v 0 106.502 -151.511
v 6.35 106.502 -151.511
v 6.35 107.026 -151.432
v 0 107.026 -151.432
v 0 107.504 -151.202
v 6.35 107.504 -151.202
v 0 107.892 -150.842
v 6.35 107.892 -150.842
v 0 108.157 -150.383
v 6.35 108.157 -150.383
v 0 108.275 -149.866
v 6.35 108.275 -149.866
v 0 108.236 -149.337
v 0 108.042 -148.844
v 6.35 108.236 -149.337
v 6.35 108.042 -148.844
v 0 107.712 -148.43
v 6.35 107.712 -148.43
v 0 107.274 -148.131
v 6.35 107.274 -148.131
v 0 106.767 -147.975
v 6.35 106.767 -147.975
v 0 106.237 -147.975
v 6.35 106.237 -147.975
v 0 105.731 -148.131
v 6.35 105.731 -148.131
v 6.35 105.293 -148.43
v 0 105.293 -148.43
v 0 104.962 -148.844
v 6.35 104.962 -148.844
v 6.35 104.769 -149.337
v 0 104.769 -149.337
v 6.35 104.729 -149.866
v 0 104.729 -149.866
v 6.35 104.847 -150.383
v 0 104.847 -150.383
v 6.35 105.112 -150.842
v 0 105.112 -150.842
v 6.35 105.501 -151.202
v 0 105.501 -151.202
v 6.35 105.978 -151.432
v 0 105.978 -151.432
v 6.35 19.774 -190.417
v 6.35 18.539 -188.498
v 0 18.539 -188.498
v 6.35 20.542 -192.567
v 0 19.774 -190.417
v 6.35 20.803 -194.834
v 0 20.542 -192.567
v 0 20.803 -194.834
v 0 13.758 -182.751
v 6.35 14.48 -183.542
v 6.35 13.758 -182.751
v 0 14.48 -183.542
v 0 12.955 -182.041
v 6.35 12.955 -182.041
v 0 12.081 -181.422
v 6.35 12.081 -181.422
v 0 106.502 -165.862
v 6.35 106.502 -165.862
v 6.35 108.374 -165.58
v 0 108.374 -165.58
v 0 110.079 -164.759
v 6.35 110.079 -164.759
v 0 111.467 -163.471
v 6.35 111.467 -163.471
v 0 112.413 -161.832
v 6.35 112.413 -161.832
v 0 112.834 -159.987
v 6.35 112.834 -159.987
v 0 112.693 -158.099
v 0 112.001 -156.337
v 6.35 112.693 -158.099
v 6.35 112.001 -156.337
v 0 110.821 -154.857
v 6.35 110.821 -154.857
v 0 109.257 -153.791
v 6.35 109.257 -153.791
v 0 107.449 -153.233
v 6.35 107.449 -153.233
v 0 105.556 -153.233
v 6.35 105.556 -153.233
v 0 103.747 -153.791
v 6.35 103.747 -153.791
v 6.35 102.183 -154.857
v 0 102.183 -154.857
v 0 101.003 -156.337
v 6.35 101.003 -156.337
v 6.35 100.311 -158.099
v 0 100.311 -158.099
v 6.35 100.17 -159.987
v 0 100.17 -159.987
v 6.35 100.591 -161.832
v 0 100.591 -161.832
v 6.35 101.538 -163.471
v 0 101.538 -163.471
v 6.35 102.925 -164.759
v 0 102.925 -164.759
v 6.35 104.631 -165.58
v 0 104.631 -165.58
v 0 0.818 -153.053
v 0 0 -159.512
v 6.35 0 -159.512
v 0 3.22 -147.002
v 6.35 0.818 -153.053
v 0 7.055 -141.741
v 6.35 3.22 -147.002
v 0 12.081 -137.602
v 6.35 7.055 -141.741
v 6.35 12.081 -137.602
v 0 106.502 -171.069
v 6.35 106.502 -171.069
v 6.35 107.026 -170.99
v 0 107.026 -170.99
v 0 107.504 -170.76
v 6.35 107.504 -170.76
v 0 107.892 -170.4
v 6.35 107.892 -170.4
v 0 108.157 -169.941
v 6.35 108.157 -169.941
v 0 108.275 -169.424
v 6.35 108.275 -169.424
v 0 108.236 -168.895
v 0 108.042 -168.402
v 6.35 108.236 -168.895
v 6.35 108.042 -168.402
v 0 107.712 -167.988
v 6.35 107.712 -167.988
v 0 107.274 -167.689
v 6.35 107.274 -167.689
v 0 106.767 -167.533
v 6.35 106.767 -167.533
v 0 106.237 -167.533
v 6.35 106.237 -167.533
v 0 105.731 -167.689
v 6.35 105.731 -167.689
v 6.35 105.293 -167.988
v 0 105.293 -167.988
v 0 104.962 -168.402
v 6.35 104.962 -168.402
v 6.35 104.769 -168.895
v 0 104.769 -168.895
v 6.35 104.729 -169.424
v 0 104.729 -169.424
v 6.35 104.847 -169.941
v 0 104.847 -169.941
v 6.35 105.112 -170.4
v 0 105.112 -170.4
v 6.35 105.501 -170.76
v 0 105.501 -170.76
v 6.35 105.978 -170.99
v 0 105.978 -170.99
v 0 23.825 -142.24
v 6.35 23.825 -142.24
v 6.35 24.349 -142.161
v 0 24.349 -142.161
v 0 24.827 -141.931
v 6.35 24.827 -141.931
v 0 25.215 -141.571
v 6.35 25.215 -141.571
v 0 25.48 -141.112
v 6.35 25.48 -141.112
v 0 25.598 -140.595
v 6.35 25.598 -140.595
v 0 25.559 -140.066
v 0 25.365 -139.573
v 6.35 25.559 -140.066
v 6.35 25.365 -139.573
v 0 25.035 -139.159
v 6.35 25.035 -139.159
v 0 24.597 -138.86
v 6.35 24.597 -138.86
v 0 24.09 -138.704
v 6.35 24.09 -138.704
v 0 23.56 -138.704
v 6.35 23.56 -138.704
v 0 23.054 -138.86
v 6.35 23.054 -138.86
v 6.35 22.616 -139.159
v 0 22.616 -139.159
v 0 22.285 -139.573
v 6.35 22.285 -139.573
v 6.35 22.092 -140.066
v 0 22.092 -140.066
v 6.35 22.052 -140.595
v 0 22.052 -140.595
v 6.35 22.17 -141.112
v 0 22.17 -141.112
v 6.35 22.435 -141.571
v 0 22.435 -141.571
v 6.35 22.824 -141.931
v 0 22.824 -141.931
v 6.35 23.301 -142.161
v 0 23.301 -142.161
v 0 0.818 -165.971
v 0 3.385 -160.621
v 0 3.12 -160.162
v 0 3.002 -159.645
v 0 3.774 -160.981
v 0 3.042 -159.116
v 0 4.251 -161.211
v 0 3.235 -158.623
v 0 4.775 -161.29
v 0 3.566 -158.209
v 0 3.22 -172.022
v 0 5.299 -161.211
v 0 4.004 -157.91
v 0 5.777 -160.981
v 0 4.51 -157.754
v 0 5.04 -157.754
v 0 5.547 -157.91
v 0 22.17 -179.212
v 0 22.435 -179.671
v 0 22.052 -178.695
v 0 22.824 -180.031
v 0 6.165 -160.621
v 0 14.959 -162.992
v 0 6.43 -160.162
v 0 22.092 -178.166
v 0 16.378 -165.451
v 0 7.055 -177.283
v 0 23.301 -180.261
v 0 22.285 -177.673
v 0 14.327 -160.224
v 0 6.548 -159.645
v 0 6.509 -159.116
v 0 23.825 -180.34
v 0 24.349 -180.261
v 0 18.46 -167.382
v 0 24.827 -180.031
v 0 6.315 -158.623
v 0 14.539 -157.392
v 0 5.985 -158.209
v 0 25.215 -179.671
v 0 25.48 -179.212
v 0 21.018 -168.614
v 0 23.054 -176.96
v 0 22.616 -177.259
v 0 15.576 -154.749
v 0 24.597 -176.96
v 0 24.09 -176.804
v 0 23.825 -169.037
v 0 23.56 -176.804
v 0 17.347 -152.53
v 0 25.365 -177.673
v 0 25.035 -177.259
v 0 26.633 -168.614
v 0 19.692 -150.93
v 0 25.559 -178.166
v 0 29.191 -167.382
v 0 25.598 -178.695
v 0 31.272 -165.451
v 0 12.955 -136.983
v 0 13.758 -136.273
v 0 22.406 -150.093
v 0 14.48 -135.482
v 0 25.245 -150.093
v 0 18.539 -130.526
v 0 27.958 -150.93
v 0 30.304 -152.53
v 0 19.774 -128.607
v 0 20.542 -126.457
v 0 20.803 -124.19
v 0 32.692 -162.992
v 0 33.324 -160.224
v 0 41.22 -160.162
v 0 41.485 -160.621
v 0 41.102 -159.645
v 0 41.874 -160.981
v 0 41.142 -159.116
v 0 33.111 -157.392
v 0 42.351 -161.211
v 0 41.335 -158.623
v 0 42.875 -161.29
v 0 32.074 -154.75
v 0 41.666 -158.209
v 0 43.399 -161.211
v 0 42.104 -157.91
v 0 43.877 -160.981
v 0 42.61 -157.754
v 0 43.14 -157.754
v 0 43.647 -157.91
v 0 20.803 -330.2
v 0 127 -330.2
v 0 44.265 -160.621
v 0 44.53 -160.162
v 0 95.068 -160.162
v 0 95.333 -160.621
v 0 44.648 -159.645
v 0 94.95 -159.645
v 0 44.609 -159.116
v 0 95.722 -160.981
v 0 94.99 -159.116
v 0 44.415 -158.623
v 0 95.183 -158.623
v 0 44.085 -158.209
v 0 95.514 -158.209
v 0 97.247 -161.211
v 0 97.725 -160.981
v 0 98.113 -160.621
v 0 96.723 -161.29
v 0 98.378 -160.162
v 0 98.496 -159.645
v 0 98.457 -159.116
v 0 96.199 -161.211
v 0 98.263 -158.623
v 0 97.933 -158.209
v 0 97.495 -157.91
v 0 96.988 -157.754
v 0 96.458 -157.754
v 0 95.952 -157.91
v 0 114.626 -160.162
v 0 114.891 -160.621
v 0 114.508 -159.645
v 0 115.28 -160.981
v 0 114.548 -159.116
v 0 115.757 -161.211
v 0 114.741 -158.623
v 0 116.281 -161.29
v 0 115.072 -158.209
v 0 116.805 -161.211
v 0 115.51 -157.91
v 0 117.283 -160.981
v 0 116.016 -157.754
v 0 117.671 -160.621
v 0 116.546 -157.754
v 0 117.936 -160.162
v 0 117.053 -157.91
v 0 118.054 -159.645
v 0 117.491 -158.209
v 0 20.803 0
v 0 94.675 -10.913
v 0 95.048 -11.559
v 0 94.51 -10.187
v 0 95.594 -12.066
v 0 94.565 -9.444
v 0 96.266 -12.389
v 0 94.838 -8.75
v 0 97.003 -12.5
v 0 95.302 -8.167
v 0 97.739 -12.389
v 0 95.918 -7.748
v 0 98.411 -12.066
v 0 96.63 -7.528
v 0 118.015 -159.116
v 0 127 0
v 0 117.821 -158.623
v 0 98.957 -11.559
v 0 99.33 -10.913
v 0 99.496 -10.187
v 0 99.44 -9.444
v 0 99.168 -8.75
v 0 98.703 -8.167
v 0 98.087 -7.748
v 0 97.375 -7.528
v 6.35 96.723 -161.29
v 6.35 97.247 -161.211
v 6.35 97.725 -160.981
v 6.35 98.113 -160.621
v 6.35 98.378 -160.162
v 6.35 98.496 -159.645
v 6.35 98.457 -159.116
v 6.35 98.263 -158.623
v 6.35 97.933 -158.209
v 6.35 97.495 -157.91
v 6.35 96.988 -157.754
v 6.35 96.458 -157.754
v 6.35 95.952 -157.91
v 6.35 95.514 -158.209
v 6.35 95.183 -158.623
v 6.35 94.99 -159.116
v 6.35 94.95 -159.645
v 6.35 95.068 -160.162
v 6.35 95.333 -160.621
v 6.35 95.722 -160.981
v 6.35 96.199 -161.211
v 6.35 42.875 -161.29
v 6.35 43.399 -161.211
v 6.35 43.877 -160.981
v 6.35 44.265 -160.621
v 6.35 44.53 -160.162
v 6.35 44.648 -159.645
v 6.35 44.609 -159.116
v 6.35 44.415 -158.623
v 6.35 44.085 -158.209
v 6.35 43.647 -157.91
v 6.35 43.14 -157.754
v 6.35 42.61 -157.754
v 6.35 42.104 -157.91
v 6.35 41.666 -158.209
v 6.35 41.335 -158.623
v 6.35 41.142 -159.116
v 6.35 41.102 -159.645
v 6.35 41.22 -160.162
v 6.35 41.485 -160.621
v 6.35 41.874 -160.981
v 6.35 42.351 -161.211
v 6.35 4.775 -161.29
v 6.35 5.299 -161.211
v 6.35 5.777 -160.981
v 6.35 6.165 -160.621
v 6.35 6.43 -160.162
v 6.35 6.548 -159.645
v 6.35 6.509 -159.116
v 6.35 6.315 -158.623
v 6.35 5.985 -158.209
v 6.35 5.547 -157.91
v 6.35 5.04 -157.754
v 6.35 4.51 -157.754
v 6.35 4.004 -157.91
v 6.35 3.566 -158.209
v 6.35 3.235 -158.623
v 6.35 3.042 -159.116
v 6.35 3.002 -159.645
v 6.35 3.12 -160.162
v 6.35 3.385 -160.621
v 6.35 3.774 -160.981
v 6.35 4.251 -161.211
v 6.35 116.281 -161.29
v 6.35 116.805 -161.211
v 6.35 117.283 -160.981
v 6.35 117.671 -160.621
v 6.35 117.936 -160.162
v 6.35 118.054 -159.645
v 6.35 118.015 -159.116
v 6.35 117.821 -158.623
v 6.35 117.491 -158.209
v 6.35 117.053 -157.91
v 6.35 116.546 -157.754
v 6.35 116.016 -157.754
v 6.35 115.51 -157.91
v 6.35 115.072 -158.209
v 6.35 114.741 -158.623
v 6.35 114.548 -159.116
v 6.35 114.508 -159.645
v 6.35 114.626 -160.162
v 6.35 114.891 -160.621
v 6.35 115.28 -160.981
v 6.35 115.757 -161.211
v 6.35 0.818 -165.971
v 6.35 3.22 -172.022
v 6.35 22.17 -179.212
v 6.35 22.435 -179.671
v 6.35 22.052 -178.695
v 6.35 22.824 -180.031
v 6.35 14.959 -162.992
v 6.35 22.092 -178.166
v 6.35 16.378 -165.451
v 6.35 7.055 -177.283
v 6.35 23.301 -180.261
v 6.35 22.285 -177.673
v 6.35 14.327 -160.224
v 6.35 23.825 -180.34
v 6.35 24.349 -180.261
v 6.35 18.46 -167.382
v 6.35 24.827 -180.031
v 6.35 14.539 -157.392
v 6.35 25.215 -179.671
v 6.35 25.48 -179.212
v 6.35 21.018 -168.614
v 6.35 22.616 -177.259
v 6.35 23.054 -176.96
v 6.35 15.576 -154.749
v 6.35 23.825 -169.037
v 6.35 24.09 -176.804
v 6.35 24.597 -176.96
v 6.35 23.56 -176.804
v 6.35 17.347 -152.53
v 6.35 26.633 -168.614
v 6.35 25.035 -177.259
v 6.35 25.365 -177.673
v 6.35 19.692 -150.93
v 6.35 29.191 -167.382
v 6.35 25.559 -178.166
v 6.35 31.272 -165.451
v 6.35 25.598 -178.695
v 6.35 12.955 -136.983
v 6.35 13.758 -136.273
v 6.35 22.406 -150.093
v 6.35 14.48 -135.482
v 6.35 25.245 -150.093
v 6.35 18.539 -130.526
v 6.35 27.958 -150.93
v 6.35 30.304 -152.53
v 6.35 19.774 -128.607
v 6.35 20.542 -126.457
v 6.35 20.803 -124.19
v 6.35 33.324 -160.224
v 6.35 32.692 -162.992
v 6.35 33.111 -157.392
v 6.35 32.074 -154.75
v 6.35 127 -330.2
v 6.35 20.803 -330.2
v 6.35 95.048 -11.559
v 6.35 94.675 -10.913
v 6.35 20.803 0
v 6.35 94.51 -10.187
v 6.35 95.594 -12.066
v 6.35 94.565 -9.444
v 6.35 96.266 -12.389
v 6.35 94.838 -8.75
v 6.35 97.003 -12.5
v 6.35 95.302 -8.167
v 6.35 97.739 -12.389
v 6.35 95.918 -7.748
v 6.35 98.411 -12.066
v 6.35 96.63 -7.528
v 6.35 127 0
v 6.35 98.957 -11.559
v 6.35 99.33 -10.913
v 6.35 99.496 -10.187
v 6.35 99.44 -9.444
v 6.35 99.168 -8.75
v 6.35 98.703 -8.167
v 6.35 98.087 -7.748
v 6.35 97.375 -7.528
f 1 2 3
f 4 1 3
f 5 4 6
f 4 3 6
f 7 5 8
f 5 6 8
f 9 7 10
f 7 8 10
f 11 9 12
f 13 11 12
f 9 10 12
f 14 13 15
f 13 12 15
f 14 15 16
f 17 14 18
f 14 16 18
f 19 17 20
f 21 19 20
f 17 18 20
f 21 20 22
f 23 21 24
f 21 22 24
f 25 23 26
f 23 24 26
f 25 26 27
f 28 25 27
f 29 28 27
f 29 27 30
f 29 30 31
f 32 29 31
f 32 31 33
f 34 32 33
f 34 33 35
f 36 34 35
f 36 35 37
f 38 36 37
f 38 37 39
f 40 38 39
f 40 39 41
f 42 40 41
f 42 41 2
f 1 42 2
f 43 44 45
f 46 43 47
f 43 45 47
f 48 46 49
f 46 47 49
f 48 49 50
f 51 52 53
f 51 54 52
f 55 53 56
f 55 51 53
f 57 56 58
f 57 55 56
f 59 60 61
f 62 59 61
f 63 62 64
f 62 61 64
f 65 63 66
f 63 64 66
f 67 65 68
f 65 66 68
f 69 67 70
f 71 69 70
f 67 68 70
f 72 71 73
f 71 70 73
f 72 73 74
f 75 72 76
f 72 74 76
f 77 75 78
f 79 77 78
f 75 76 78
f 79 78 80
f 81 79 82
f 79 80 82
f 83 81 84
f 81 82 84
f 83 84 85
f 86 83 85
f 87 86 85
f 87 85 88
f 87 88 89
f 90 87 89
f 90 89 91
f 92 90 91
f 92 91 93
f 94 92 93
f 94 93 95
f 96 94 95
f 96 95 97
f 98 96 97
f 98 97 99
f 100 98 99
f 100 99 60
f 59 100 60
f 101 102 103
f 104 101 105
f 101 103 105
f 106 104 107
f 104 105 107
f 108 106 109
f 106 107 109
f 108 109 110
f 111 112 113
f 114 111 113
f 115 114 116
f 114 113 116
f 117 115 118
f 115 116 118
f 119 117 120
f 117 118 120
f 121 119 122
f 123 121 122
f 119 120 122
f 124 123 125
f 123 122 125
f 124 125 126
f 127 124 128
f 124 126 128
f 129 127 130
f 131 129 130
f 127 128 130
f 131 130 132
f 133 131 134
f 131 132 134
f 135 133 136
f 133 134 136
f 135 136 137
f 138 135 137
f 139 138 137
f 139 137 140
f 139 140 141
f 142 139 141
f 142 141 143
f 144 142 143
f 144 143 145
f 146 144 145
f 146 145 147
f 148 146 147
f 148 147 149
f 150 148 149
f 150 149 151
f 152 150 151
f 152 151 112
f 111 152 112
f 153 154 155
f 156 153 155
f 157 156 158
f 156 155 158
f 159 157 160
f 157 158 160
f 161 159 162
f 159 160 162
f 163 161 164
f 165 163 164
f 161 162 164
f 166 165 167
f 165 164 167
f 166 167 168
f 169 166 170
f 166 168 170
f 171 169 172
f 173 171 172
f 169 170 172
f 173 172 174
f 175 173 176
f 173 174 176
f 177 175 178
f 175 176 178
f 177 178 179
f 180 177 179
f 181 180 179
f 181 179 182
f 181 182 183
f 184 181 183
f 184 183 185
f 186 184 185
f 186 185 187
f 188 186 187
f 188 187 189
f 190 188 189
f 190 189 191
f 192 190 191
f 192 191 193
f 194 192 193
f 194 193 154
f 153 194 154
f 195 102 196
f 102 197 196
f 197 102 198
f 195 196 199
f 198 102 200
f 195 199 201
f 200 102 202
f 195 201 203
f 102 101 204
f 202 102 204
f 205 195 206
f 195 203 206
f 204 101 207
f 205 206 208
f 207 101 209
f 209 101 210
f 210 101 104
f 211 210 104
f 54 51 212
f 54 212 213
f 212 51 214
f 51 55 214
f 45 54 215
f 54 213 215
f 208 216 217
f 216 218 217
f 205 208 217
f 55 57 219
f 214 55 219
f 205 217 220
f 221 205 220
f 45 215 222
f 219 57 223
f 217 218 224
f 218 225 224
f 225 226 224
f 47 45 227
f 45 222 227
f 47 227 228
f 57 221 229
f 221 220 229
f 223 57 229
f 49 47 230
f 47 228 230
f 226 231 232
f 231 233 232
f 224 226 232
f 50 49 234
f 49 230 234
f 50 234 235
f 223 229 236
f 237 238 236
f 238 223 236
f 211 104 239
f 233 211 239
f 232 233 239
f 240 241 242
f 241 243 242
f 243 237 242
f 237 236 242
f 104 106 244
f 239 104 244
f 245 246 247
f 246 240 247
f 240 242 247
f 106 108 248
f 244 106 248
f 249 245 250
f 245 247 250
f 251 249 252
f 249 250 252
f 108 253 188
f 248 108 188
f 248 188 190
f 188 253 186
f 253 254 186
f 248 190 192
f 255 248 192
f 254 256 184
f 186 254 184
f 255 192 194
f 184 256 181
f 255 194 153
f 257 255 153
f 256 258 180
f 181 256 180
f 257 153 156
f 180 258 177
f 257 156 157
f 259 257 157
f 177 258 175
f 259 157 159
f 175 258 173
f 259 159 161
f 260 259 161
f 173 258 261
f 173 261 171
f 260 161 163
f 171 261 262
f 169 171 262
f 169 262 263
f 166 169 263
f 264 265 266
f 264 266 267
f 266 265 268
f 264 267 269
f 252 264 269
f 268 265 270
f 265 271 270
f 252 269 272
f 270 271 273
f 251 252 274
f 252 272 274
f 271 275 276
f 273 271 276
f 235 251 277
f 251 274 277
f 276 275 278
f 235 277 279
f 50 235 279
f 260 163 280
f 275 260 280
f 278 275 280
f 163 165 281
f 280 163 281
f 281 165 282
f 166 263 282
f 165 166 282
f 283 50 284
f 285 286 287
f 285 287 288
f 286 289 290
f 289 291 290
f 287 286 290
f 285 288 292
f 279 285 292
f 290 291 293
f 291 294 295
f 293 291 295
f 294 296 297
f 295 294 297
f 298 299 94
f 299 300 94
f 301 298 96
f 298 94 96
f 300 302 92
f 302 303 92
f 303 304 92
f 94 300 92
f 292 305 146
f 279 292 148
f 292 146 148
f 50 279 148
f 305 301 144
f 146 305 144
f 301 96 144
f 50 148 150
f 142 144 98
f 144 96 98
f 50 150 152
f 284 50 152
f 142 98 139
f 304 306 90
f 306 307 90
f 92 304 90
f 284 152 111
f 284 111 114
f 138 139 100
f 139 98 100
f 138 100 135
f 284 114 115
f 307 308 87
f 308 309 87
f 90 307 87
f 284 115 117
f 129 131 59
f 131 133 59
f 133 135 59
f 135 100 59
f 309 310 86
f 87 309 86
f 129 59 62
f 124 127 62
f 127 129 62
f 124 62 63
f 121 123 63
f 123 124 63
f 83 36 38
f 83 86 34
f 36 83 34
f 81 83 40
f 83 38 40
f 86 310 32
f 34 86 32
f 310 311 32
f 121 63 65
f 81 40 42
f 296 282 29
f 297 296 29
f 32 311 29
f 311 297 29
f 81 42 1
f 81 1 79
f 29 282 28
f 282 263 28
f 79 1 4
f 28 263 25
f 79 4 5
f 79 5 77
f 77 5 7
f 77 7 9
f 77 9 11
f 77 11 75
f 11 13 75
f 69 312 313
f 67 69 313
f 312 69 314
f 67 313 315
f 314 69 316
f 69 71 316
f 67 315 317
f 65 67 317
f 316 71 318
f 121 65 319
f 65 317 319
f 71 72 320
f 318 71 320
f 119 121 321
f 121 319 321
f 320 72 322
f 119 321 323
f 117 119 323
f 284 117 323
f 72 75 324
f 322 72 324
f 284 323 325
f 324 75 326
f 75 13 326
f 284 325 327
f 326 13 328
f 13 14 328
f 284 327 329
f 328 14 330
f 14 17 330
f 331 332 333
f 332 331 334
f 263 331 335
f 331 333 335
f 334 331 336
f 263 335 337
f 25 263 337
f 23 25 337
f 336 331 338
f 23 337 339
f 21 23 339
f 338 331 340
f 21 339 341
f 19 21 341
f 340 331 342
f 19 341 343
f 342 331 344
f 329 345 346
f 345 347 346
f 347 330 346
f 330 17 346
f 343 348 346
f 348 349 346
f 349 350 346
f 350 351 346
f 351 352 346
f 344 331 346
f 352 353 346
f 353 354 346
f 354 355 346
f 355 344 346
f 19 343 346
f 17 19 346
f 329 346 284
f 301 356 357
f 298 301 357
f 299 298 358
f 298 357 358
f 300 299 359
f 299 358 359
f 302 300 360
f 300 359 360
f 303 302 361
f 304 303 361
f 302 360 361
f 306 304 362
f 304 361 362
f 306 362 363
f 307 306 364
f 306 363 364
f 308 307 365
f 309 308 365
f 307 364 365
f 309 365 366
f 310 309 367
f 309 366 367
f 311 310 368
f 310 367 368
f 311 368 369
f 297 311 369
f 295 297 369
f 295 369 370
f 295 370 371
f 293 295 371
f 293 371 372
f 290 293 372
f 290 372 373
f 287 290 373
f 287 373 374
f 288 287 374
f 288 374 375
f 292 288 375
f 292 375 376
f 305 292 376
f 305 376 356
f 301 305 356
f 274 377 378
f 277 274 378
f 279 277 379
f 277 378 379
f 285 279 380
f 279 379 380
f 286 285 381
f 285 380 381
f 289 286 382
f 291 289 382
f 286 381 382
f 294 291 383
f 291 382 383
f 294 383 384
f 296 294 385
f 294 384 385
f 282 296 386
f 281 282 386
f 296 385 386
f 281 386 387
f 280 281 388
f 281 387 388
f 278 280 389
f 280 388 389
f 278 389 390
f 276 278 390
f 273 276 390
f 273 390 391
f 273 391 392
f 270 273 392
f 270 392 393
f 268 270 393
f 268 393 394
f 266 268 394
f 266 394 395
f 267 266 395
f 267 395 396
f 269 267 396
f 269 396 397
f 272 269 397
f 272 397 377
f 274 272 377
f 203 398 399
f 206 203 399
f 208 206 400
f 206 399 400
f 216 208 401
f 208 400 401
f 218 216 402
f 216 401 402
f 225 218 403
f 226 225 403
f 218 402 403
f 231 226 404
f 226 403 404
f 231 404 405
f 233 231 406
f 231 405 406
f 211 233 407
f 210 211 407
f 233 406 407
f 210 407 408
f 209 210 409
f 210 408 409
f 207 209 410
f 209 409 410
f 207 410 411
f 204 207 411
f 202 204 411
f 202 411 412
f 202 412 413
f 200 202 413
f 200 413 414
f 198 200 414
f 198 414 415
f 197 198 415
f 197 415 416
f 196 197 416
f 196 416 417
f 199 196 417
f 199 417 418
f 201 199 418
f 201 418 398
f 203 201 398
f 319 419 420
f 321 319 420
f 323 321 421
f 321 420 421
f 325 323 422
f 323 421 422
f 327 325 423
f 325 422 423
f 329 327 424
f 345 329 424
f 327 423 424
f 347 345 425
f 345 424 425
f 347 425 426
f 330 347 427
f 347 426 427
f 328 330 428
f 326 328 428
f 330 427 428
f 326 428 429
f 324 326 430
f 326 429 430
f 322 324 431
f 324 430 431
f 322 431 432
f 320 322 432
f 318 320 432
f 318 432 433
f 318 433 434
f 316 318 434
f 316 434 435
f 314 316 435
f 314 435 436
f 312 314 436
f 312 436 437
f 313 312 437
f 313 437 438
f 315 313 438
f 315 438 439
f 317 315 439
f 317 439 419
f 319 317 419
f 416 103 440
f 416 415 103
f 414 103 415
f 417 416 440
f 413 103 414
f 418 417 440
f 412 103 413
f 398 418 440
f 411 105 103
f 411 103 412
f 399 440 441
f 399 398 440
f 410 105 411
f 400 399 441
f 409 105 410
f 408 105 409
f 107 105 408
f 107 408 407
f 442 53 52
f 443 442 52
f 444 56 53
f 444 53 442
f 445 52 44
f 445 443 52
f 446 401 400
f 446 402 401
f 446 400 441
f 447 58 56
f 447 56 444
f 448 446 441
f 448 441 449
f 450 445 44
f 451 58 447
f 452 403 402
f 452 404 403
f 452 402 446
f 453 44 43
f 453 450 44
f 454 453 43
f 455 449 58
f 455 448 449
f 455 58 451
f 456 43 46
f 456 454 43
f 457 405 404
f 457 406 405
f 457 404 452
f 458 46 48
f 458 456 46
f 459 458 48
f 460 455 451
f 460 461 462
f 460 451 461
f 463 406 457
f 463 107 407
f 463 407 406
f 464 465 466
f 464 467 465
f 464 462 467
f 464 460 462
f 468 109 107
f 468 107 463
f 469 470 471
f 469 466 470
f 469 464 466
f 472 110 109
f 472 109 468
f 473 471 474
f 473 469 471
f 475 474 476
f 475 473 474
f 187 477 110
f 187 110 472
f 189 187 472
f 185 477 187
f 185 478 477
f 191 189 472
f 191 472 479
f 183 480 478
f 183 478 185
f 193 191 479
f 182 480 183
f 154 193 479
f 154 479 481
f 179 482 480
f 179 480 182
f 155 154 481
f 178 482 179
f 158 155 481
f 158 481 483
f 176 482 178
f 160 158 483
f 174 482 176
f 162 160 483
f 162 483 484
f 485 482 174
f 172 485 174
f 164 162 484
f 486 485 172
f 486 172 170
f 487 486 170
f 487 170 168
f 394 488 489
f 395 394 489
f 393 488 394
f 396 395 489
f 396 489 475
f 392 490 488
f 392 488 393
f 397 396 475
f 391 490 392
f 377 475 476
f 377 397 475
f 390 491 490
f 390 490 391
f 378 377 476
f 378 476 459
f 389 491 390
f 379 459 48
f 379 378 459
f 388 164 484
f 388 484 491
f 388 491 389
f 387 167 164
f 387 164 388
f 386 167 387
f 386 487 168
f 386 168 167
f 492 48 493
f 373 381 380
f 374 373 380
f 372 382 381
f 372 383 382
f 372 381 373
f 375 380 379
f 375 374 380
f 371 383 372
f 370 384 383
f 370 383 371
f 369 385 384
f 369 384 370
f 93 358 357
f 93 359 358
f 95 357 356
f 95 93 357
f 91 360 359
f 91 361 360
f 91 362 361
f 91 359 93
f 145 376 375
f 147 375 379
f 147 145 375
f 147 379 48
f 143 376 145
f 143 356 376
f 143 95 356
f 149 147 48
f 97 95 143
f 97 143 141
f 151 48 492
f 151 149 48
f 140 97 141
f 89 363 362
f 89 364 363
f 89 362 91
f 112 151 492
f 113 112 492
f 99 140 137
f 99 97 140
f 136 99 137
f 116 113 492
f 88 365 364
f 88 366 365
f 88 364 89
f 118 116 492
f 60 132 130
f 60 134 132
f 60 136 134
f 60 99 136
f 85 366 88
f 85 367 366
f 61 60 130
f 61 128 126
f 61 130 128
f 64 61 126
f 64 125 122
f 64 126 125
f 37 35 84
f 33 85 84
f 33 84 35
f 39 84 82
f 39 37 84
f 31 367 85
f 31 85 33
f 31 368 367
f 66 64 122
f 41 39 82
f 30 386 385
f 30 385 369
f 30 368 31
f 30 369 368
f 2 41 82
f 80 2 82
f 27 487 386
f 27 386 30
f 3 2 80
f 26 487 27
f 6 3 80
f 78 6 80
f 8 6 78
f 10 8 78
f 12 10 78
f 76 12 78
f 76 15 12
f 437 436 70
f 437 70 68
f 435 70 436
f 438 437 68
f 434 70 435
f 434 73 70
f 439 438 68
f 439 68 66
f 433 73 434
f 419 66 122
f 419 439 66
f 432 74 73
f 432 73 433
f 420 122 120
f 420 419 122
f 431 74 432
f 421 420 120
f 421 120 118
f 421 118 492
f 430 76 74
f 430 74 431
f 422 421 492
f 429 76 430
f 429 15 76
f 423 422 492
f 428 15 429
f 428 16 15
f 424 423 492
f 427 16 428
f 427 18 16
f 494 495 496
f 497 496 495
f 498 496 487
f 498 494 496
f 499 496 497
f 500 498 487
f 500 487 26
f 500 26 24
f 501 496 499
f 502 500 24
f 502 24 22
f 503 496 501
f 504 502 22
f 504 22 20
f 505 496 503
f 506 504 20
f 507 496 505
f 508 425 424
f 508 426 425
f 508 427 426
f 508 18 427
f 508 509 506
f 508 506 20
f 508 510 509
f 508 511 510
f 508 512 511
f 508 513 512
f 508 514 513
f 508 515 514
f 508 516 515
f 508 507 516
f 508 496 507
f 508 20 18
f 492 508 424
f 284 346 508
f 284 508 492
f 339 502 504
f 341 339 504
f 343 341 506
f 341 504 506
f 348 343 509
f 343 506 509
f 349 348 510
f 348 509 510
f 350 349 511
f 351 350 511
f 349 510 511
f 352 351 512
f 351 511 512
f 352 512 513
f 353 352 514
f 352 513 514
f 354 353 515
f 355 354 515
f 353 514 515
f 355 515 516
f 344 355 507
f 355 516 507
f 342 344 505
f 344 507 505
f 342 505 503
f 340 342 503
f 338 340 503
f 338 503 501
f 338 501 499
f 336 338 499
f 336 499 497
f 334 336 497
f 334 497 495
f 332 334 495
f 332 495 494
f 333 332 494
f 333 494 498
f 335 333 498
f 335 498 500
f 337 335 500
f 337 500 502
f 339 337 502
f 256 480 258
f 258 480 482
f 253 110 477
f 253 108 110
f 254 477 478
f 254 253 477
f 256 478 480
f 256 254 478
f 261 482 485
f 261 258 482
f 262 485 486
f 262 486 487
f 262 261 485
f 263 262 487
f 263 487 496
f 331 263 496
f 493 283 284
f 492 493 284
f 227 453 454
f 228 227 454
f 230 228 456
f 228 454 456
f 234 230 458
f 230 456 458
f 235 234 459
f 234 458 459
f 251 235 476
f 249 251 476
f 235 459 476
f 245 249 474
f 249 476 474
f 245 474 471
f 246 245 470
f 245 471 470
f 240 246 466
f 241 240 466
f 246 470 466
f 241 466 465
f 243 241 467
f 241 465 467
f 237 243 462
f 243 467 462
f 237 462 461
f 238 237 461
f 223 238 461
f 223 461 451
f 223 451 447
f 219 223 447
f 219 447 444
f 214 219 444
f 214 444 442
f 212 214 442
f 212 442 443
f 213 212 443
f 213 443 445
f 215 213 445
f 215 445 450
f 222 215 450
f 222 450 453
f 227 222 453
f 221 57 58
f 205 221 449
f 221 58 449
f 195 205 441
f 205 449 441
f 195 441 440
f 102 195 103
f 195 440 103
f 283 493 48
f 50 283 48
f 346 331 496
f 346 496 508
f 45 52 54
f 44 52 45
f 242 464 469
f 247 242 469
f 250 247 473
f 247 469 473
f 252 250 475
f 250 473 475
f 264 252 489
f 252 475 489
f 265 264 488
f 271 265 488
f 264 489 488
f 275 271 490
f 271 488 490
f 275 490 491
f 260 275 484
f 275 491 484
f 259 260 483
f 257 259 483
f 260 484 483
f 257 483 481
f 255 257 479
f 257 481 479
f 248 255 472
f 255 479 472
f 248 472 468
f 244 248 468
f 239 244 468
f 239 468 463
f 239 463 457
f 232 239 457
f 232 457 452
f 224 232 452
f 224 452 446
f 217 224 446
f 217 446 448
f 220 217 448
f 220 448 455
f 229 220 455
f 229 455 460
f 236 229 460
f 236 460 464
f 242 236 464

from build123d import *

# Parameters (mm, degrees)
SKETCH1_W                                     = 330.2
SKETCH1_H                                     = 127
MAIN_PLATE_SIZE_DEPTH                         = 6.35
SKETCH2_R                                     = 9.525
SKETCH2_R_2                                   = 1.778
BOTTOM_SHAFT_MOUNTING_HOLES_DEPTH             = 354.83804558
SKETCH3_R                                     = 6.35
SKETCH3_R_2                                   = 1.778
TOP_BATTERY_BOX_MOUNTING_HOLES_DEPTH          = 354.83804558
THIS_IS_TO_MATCH_THE_IDIOTIC_DESIGN_OF_B_SIZE = 6.35
THIS_IS_TO_MATCH_THE_IDIOTIC_DESIGN_2_R       = 10
SKETCH4_R                                     = 2.5
F_20MM_EXTRUSION_MOUNT_DEPTH                  = 354.83804558


with BuildPart() as part:
    # Sketch1 → Main Plate Size (new body)
    with BuildSketch(Plane(origin=(0, 0, 0), x_dir=(0, 0, -1), z_dir=(1, 0, 0))):
        with Locations((165.1, 63.5)):
            Rectangle(SKETCH1_W, SKETCH1_H)
    extrude(amount=MAIN_PLATE_SIZE_DEPTH)

    # Sketch2 → Bottom Shaft Mounting Holes (cut, through all)
    with BuildSketch(Plane(origin=(6.35, 0, 0), x_dir=(0, 0, -1), z_dir=(1, 0, 0))):
        with BuildLine():
            Line((134.1120127, 20.8026), (0, 20.8026))
            Line((0, 20.8026), (0, 0))
            Line((0, 0), (159.512000023, 0))
            ThreePointArc((159.512000023, 0), (143.096249024, 5.864358018), (134.1120127, 20.8026))
        make_face()
        with BuildLine():
            ThreePointArc((184.9119873, 20.8026), (175.927750994, 5.864358033), (159.512000023, 0))
            Line((159.512000023, 0), (177.8, 0))
            Line((177.8, 0), (330.2, 0))
            Line((330.2, 0), (330.2, 20.8026))
            Line((330.2, 20.8026), (184.9119873, 20.8026))
        make_face()
        with Locations((159.512, 23.8252)):
            Circle(SKETCH2_R)
        with Locations((159.512, 4.7752)):
            Circle(SKETCH2_R_2)
        with Locations((178.562, 23.8252)):
            Circle(SKETCH2_R_2)
        with Locations((159.512, 42.8752)):
            Circle(SKETCH2_R_2)
        with Locations((140.462, 23.8252)):
            Circle(SKETCH2_R_2)
    extrude(amount=-BOTTOM_SHAFT_MOUNTING_HOLES_DEPTH, mode=Mode.SUBTRACT)

    # Sketch3 → Top Battery Box Mounting Holes (cut, through all)
    with BuildSketch(Plane(origin=(6.35, 0, 0), x_dir=(0, 0, -1), z_dir=(1, 0, 0))):
        with Locations((159.512, 106.5022)):
            Circle(SKETCH3_R)
        with Locations((149.733, 106.5022)):
            Circle(SKETCH3_R_2)
        with Locations((159.512, 116.2812)):
            Circle(SKETCH3_R_2)
        with Locations((169.291, 106.5022)):
            Circle(SKETCH3_R_2)
        with Locations((159.512, 96.7232)):
            Circle(SKETCH3_R_2)
    extrude(amount=-TOP_BATTERY_BOX_MOUNTING_HOLES_DEPTH, mode=Mode.SUBTRACT)

    # This is to match the idiotic Design of B
    # the kernel refuses this chamfer: 6.35 mm, written as the material it adds along each edge
    with BuildSketch(Plane(origin=(6.35, 20.8026, -134.1120127), x_dir=(0, -0.9387383646661532, -0.34463064678568023), z_dir=(-1, 0, 0))) as this_is_to_match_the_idiotic_design_of_b_piece_1:
        with BuildLine():
            Line((7.921958409, 0), (-THIS_IS_TO_MATCH_THE_IDIOTIC_DESIGN_OF_B_SIZE * 0.344630646786, THIS_IS_TO_MATCH_THE_IDIOTIC_DESIGN_OF_B_SIZE * 0.938738364666))
            Line((-THIS_IS_TO_MATCH_THE_IDIOTIC_DESIGN_OF_B_SIZE * 0.344630646786, THIS_IS_TO_MATCH_THE_IDIOTIC_DESIGN_OF_B_SIZE * 0.938738364666), (0, 0))
            ThreePointArc((0, 0), (4.071959946, 0.304342453), (7.921958409, 0))
        make_face()
    extrude(amount=6.35)
    with BuildSketch(Plane(origin=(6.35, 20.8026, -184.9119873), x_dir=(0, -0.9387383646661542, 0.34463064678567756), z_dir=(-1, 0, 0))) as this_is_to_match_the_idiotic_design_of_b_piece_2:
        with BuildLine():
            Line((7.921958409, 0), (-THIS_IS_TO_MATCH_THE_IDIOTIC_DESIGN_OF_B_SIZE * 0.344630646786, -THIS_IS_TO_MATCH_THE_IDIOTIC_DESIGN_OF_B_SIZE * 0.938738364666))
            Line((-THIS_IS_TO_MATCH_THE_IDIOTIC_DESIGN_OF_B_SIZE * 0.344630646786, -THIS_IS_TO_MATCH_THE_IDIOTIC_DESIGN_OF_B_SIZE * 0.938738364666), (0, 0))
            ThreePointArc((0, 0), (4.071959946, -0.304342453), (7.921958409, 0))
        make_face()
    extrude(amount=6.35)

    # This is to match the idiotic Design  2
    this_is_to_match_the_idiotic_design_2_edges = [part.edges().sort_by_distance(p)[0] for p in [
        (3.175, 13.365953718, -136.84216235),
        (3.175, 13.365953718, -182.18183765),
        (3.175, 20.8026, -191.2619873),
        (3.175, 20.8026, -127.7620127),
    ]]
    fillet(this_is_to_match_the_idiotic_design_2_edges, radius=THIS_IS_TO_MATCH_THE_IDIOTIC_DESIGN_2_R)

    # Sketch4 → 20mm Extrusion Mount (cut, through all)
    with BuildSketch(Plane(origin=(6.35, 0, 0), x_dir=(0, 0, -1), z_dir=(1, 0, 0))):
        with Locations((10, 97.0026)):
            Circle(SKETCH4_R)
    extrude(amount=-F_20MM_EXTRUSION_MOUNT_DEPTH, mode=Mode.SUBTRACT)


solid = part.part
